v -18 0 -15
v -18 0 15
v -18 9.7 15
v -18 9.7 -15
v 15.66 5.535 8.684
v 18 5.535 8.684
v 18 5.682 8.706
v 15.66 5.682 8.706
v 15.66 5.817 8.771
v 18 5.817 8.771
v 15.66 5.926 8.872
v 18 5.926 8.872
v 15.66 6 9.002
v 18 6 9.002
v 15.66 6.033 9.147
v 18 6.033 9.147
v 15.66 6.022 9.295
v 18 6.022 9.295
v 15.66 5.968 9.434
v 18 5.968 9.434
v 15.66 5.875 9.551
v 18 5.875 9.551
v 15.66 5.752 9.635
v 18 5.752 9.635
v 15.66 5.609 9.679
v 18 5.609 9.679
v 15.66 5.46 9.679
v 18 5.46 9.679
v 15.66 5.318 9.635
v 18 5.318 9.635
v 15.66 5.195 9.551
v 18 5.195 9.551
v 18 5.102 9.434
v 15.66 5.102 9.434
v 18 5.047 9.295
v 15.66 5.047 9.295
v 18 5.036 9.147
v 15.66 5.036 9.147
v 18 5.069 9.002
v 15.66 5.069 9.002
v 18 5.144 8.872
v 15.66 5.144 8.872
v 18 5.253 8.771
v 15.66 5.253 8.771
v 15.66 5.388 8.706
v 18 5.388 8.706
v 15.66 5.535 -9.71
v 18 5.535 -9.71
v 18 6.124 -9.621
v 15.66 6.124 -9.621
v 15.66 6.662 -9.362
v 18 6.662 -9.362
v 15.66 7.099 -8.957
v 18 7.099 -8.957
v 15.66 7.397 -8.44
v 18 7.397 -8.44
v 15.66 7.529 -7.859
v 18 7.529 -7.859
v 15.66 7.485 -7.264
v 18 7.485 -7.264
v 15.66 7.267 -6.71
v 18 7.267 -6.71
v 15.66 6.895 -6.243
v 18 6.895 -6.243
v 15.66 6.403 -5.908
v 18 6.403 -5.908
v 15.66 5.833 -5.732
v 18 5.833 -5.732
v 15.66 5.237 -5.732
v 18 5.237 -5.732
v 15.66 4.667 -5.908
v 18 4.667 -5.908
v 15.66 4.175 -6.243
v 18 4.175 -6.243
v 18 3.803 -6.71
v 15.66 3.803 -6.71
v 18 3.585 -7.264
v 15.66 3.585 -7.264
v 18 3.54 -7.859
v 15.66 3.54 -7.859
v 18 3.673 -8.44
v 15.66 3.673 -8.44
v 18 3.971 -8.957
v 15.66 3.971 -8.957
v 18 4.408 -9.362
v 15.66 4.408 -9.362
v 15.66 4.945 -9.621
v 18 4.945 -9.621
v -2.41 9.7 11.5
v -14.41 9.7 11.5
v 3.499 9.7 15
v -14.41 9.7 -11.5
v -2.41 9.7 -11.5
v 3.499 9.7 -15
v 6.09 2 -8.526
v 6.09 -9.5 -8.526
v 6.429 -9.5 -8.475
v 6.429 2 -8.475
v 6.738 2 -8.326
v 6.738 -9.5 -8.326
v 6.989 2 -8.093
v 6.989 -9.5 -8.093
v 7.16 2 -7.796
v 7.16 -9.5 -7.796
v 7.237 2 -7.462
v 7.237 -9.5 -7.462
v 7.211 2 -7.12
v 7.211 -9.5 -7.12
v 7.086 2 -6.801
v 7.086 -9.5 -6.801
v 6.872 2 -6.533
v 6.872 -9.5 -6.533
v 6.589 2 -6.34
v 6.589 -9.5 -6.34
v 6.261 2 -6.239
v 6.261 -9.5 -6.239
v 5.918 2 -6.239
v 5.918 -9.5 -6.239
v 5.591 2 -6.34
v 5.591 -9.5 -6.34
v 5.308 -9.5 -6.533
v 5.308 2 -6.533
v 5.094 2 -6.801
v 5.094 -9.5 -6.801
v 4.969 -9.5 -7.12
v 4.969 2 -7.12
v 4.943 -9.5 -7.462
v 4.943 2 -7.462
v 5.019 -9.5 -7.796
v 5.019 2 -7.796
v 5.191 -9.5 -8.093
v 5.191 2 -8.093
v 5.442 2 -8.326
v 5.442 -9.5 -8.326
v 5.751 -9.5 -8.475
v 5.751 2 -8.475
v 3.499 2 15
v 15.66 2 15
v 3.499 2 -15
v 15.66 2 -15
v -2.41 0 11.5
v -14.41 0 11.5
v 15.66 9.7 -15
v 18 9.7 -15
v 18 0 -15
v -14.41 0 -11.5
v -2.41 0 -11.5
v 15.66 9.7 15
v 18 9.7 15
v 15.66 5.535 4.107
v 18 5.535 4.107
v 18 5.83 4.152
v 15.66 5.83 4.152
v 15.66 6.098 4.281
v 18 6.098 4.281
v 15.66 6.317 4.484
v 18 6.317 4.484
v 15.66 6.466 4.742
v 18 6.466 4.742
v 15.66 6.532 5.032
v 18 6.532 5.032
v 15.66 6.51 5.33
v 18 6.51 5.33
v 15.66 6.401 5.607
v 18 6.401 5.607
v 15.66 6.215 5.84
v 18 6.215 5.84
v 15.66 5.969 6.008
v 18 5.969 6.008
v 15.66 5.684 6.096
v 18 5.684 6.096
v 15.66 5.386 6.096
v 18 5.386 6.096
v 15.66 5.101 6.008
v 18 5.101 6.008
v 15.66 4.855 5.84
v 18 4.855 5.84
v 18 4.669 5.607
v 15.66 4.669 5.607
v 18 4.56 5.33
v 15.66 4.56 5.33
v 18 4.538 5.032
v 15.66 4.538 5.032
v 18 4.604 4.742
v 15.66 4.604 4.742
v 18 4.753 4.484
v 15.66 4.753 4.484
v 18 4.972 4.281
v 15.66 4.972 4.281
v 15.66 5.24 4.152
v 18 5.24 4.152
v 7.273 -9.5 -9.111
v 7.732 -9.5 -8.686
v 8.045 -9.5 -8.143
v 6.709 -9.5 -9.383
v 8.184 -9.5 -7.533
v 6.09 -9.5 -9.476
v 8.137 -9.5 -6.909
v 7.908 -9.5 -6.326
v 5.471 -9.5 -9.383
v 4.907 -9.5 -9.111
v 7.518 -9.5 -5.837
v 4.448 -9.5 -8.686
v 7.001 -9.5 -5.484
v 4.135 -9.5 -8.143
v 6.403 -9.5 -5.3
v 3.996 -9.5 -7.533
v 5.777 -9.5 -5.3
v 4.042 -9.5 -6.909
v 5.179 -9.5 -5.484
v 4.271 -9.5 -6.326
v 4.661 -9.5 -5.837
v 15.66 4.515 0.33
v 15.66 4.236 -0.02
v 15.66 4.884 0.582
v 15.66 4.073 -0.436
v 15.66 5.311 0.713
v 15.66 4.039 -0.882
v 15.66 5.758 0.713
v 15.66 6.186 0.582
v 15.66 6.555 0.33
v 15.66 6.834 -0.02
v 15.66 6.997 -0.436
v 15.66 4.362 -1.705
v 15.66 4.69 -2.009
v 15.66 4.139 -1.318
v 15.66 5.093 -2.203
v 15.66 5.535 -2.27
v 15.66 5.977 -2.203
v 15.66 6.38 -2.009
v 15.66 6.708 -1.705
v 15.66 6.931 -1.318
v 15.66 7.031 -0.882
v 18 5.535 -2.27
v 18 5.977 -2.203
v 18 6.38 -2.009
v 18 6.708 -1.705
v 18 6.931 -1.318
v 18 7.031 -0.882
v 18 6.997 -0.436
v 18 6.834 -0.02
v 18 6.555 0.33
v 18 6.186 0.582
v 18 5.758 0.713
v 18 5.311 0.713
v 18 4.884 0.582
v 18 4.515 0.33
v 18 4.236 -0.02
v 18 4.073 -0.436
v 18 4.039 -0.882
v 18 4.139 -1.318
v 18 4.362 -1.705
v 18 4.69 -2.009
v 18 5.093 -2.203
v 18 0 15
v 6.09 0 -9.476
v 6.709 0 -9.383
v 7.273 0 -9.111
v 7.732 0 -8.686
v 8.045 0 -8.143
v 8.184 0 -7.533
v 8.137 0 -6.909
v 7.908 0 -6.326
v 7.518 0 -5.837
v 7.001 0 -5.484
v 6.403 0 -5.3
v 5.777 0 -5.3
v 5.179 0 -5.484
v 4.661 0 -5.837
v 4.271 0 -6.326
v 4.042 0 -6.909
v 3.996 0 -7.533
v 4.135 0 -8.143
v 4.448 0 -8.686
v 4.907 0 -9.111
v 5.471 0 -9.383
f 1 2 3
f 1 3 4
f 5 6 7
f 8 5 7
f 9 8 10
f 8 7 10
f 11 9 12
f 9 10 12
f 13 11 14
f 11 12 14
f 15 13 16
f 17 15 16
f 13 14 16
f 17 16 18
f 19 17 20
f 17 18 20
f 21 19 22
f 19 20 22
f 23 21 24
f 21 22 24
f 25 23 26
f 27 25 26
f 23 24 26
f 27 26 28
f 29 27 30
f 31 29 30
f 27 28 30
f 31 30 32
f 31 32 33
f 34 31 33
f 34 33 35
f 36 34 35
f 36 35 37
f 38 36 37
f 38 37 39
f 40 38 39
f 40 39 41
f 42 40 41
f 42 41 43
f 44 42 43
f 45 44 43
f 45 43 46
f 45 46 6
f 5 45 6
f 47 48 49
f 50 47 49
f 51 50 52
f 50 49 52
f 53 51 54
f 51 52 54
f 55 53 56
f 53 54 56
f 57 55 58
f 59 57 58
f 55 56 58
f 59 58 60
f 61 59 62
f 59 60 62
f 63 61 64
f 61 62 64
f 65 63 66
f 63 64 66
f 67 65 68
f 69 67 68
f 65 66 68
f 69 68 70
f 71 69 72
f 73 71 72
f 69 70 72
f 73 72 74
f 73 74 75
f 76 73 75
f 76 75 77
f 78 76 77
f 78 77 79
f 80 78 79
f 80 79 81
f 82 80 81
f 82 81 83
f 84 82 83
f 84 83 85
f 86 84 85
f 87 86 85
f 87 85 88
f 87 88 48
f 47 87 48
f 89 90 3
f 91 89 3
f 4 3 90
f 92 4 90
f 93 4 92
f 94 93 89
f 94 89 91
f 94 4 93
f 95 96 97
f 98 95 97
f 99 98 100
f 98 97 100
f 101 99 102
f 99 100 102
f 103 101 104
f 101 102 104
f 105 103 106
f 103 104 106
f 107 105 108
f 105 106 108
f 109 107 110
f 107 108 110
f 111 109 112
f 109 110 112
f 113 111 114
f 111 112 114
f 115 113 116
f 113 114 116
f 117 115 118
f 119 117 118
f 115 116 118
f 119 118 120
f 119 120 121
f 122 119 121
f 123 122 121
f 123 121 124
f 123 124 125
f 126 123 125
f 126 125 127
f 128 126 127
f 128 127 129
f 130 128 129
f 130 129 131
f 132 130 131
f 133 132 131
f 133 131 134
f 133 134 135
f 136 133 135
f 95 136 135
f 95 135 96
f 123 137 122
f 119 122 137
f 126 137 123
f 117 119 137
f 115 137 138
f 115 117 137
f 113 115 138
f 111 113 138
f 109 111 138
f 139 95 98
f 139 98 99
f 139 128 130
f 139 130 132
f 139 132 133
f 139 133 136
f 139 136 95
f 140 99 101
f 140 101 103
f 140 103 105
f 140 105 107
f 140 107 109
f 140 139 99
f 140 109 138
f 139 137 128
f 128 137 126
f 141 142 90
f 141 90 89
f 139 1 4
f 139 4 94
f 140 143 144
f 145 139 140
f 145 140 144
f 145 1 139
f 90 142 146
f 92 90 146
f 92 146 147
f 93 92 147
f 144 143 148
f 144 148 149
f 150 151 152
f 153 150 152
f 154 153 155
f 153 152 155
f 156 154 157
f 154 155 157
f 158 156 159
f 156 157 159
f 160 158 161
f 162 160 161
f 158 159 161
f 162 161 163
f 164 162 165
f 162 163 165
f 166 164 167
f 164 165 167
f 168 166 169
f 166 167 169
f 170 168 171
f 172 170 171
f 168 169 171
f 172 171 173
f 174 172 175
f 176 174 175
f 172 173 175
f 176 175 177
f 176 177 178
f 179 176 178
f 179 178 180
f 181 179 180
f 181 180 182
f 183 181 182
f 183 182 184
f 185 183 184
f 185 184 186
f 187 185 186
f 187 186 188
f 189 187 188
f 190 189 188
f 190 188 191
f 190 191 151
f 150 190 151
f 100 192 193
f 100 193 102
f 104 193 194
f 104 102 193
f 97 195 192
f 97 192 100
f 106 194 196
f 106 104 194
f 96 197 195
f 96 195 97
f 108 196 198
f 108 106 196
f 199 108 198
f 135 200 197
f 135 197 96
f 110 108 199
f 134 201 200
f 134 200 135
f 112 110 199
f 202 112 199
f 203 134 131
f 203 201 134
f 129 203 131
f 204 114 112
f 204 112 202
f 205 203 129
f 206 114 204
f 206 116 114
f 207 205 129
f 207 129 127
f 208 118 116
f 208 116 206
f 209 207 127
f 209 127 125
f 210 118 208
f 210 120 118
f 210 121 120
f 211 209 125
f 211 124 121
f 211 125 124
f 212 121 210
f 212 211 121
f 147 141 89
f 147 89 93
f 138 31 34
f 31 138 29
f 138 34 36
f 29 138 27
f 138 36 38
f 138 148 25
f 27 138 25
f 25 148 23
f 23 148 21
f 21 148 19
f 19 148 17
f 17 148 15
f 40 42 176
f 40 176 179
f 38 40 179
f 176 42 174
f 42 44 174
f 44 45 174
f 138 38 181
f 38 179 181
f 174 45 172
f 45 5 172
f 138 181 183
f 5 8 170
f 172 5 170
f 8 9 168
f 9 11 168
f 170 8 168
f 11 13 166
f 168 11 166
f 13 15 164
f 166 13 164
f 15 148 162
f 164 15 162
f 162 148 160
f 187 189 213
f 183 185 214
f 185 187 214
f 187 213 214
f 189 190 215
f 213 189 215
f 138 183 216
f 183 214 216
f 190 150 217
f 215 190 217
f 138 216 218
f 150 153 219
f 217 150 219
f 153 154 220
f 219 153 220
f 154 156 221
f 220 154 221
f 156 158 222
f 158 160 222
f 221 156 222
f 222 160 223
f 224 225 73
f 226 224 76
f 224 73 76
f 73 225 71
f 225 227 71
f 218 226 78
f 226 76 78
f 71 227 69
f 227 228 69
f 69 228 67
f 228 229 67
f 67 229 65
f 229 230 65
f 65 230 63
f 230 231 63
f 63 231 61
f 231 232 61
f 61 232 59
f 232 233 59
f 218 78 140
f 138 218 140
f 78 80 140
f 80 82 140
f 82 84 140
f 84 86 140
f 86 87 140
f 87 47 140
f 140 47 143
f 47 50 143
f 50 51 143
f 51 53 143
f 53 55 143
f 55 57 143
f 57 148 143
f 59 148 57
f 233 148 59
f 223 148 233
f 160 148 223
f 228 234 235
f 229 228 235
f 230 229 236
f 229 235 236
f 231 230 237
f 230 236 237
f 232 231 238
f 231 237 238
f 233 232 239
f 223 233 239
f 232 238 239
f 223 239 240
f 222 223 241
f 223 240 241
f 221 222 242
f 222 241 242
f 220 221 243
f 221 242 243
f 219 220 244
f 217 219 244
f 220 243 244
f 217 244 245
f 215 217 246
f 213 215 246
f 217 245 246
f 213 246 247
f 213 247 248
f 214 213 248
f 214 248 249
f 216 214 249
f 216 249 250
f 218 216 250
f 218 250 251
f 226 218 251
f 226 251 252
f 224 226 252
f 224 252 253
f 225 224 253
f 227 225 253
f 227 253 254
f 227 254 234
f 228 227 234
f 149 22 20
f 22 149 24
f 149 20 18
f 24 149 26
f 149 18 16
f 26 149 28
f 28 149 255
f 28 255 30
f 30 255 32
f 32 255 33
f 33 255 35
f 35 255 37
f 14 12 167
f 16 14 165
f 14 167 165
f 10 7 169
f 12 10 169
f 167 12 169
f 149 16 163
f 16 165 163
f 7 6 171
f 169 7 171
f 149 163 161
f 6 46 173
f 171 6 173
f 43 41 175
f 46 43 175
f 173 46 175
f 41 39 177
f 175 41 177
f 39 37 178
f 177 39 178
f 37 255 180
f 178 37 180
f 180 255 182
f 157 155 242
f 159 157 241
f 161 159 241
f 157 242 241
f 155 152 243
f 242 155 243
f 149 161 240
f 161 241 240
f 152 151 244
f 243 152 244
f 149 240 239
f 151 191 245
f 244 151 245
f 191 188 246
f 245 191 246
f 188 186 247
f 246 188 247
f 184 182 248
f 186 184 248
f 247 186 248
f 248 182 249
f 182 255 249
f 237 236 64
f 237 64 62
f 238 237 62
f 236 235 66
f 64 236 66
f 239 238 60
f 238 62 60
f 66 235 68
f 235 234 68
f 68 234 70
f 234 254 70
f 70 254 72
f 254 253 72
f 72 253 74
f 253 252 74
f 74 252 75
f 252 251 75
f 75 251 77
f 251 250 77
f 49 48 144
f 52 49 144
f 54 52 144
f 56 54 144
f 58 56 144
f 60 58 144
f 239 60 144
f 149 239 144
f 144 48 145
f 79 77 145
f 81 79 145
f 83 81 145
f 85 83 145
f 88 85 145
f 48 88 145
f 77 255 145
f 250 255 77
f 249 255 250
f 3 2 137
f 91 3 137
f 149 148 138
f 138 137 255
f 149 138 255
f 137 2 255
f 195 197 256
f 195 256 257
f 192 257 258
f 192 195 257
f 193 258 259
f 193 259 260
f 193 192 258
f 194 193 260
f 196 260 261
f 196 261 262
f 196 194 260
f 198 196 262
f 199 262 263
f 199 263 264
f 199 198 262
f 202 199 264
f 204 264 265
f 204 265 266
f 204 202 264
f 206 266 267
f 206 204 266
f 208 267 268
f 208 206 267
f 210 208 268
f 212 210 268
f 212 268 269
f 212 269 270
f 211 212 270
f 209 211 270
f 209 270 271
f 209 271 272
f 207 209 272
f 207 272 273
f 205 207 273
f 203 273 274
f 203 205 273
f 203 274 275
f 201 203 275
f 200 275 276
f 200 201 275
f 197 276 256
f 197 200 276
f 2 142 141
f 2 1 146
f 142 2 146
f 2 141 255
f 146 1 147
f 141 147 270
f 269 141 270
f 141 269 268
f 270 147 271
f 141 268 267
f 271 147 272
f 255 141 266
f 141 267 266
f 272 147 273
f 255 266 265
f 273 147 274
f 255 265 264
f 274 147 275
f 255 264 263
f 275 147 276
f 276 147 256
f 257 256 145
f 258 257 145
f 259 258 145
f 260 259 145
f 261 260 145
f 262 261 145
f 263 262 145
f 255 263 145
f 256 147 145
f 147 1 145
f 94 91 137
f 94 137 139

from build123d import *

# Parameters (mm, degrees)
SKETCH_1_W          = 36
SKETCH_1_H          = 30
EXTRUDE_1_DEPTH     = 10
EXTRUDE_2_DEPTH     = 6
SKETCH_2_W          = 12.160825217
SKETCH_2_H          = 34.685599871
CUT_EXTRUDE_1_DEPTH = 8
SKETCH_3_R          = 0.5
SKETCH_3_R_2        = 1
SKETCH_3_R_3        = 1.5
SKETCH_3_R_4        = 2
CUT_EXTRUDE_2_DEPTH = 8
SKETCH_4_R          = 4.417962551
CUT_EXTRUDE_3_DEPTH = 0.1
SKETCH_5_R          = 5.05323065
CUT_EXTRUDE_4_DEPTH = 1.4
SKETCH_6_R          = 1
CUT_EXTRUDE_6_DEPTH = 10
SKETCH_11_R         = 2.55
SKETCH_11_R_2       = 1
EXTRUDE_3_DEPTH     = 5
SKETCH_12_OUTSIDE_W = 48.152
SKETCH_12_OUTSIDE_H = 42.152
SKETCH_12_OUTSIDE_R = 2.1
CUT_EXTRUDE_7_DEPTH = 9.5
SKETCH_13_R         = 1.15
CUT_EXTRUDE_8_DEPTH = 13.5
SKETCH_14_W         = 102.67858786
SKETCH_14_H         = 80.280273631
CUT_EXTRUDE_9_DEPTH = 0.3


with BuildPart() as part:
    # 草图1 → 凸台-拉伸1 (new body)
    with BuildSketch(Plane(origin=(0, 0, 0), x_dir=(1, 0, 0), z_dir=(0, 1, 0))):
        Rectangle(SKETCH_1_W, SKETCH_1_H)
        Polygon((-14.41025641, 11.5), (-2.41025641, 11.5), (-2.41025641, 7.376281108), (-2.41025641, -11.5), (-14.41025641, -11.5), align=None, mode=Mode.SUBTRACT)
    extrude(amount=EXTRUDE_1_DEPTH)

    # 草图1<4> → 凸台-拉伸2 (add)
    with BuildSketch(Plane(origin=(0, 0, 0), x_dir=(1, 0, 0), z_dir=(0, 1, 0))):
        with BuildLine():
            ThreePointArc((8.63974359, 7.376281108), (6.08974359, 9.926281108), (3.53974359, 7.376281108))
            ThreePointArc((3.53974359, 7.376281108), (6.08974359, 4.826281108), (8.63974359, 7.376281108))
        make_face()
    extrude(amount=-EXTRUDE_2_DEPTH)

    # 草图2 → 切除-拉伸1 (cut)
    with BuildSketch(Plane(origin=(0, 10, 0), x_dir=(1, 0, 0), z_dir=(0, 1, 0))):
        with Locations((9.579402218, 0.667301742)):
            Rectangle(SKETCH_2_W, SKETCH_2_H)
    extrude(amount=-CUT_EXTRUDE_1_DEPTH, mode=Mode.SUBTRACT)

    # 草图3 → 切除-拉伸2 (cut)
    with BuildSketch(Plane(origin=(18, 0, 0), x_dir=(0, 0, -1), z_dir=(1, 0, 0))):
        with Locations((-9.184219858, 5.534894538)):
            Circle(SKETCH_3_R)
        with Locations((-5.107163581, 5.534894538)):
            Circle(SKETCH_3_R_2)
        with Locations((0.769869669, 5.534894538)):
            Circle(SKETCH_3_R_3)
        with Locations((7.709539928, 5.534894538)):
            Circle(SKETCH_3_R_4)
    extrude(amount=-CUT_EXTRUDE_2_DEPTH, mode=Mode.SUBTRACT)

    # 草图4 → 切除-拉伸3 (cut)
    with BuildSketch(Plane.XZ.offset(6)):
        with Locations((5.795390071, -7.128470111)):
            Circle(SKETCH_4_R)
    extrude(amount=-CUT_EXTRUDE_3_DEPTH, mode=Mode.SUBTRACT)

    # 草图5 → 切除-拉伸4 (cut)
    with BuildSketch(Plane.XZ.offset(5.9)):
        with Locations((5.767325228, -7.296859169)):
            Circle(SKETCH_5_R)
    extrude(amount=-CUT_EXTRUDE_4_DEPTH, mode=Mode.SUBTRACT)

    # 草图6 → 切除-拉伸6 (cut)
    with BuildSketch(Plane.XZ.offset(4.5)):
        with Locations((6.08974359, -7.376281108)):
            Circle(SKETCH_6_R)
    extrude(amount=-CUT_EXTRUDE_6_DEPTH, mode=Mode.SUBTRACT)

    # 草图11 → 凸台-拉伸3 (add)
    with BuildSketch(Plane.XZ.offset(4.5)):
        with Locations((6.08974359, -7.376281108)):
            Circle(SKETCH_11_R)
        with Locations((6.08974359, -7.376281108)):
            Circle(SKETCH_11_R_2, mode=Mode.SUBTRACT)
    extrude(amount=EXTRUDE_3_DEPTH)

    # 草图12 outside → 切除-拉伸7 (cut)
    with BuildSketch(Plane.XZ.offset(9.5)):
        Rectangle(SKETCH_12_OUTSIDE_W, SKETCH_12_OUTSIDE_H)
        with Locations((6.08974359, -7.376281108)):
            Circle(SKETCH_12_OUTSIDE_R, mode=Mode.SUBTRACT)
    extrude(amount=-CUT_EXTRUDE_7_DEPTH, mode=Mode.SUBTRACT)

    # 草图13 → 切除-拉伸8 (cut)
    with BuildSketch(Plane.XZ.offset(9.5)):
        with Locations((6.08974359, -7.376281108)):
            Circle(SKETCH_13_R)
    extrude(amount=-CUT_EXTRUDE_8_DEPTH, mode=Mode.SUBTRACT)

    # 草图14 → 切除-拉伸9 (cut)
    with BuildSketch(Plane(origin=(0, 10, 0), x_dir=(1, 0, 0), z_dir=(0, 1, 0))):
        with Locations((-27.117967051, 18.219550081)):
            Rectangle(SKETCH_14_W, SKETCH_14_H)
    extrude(amount=-CUT_EXTRUDE_9_DEPTH, mode=Mode.SUBTRACT)


solid = part.part
